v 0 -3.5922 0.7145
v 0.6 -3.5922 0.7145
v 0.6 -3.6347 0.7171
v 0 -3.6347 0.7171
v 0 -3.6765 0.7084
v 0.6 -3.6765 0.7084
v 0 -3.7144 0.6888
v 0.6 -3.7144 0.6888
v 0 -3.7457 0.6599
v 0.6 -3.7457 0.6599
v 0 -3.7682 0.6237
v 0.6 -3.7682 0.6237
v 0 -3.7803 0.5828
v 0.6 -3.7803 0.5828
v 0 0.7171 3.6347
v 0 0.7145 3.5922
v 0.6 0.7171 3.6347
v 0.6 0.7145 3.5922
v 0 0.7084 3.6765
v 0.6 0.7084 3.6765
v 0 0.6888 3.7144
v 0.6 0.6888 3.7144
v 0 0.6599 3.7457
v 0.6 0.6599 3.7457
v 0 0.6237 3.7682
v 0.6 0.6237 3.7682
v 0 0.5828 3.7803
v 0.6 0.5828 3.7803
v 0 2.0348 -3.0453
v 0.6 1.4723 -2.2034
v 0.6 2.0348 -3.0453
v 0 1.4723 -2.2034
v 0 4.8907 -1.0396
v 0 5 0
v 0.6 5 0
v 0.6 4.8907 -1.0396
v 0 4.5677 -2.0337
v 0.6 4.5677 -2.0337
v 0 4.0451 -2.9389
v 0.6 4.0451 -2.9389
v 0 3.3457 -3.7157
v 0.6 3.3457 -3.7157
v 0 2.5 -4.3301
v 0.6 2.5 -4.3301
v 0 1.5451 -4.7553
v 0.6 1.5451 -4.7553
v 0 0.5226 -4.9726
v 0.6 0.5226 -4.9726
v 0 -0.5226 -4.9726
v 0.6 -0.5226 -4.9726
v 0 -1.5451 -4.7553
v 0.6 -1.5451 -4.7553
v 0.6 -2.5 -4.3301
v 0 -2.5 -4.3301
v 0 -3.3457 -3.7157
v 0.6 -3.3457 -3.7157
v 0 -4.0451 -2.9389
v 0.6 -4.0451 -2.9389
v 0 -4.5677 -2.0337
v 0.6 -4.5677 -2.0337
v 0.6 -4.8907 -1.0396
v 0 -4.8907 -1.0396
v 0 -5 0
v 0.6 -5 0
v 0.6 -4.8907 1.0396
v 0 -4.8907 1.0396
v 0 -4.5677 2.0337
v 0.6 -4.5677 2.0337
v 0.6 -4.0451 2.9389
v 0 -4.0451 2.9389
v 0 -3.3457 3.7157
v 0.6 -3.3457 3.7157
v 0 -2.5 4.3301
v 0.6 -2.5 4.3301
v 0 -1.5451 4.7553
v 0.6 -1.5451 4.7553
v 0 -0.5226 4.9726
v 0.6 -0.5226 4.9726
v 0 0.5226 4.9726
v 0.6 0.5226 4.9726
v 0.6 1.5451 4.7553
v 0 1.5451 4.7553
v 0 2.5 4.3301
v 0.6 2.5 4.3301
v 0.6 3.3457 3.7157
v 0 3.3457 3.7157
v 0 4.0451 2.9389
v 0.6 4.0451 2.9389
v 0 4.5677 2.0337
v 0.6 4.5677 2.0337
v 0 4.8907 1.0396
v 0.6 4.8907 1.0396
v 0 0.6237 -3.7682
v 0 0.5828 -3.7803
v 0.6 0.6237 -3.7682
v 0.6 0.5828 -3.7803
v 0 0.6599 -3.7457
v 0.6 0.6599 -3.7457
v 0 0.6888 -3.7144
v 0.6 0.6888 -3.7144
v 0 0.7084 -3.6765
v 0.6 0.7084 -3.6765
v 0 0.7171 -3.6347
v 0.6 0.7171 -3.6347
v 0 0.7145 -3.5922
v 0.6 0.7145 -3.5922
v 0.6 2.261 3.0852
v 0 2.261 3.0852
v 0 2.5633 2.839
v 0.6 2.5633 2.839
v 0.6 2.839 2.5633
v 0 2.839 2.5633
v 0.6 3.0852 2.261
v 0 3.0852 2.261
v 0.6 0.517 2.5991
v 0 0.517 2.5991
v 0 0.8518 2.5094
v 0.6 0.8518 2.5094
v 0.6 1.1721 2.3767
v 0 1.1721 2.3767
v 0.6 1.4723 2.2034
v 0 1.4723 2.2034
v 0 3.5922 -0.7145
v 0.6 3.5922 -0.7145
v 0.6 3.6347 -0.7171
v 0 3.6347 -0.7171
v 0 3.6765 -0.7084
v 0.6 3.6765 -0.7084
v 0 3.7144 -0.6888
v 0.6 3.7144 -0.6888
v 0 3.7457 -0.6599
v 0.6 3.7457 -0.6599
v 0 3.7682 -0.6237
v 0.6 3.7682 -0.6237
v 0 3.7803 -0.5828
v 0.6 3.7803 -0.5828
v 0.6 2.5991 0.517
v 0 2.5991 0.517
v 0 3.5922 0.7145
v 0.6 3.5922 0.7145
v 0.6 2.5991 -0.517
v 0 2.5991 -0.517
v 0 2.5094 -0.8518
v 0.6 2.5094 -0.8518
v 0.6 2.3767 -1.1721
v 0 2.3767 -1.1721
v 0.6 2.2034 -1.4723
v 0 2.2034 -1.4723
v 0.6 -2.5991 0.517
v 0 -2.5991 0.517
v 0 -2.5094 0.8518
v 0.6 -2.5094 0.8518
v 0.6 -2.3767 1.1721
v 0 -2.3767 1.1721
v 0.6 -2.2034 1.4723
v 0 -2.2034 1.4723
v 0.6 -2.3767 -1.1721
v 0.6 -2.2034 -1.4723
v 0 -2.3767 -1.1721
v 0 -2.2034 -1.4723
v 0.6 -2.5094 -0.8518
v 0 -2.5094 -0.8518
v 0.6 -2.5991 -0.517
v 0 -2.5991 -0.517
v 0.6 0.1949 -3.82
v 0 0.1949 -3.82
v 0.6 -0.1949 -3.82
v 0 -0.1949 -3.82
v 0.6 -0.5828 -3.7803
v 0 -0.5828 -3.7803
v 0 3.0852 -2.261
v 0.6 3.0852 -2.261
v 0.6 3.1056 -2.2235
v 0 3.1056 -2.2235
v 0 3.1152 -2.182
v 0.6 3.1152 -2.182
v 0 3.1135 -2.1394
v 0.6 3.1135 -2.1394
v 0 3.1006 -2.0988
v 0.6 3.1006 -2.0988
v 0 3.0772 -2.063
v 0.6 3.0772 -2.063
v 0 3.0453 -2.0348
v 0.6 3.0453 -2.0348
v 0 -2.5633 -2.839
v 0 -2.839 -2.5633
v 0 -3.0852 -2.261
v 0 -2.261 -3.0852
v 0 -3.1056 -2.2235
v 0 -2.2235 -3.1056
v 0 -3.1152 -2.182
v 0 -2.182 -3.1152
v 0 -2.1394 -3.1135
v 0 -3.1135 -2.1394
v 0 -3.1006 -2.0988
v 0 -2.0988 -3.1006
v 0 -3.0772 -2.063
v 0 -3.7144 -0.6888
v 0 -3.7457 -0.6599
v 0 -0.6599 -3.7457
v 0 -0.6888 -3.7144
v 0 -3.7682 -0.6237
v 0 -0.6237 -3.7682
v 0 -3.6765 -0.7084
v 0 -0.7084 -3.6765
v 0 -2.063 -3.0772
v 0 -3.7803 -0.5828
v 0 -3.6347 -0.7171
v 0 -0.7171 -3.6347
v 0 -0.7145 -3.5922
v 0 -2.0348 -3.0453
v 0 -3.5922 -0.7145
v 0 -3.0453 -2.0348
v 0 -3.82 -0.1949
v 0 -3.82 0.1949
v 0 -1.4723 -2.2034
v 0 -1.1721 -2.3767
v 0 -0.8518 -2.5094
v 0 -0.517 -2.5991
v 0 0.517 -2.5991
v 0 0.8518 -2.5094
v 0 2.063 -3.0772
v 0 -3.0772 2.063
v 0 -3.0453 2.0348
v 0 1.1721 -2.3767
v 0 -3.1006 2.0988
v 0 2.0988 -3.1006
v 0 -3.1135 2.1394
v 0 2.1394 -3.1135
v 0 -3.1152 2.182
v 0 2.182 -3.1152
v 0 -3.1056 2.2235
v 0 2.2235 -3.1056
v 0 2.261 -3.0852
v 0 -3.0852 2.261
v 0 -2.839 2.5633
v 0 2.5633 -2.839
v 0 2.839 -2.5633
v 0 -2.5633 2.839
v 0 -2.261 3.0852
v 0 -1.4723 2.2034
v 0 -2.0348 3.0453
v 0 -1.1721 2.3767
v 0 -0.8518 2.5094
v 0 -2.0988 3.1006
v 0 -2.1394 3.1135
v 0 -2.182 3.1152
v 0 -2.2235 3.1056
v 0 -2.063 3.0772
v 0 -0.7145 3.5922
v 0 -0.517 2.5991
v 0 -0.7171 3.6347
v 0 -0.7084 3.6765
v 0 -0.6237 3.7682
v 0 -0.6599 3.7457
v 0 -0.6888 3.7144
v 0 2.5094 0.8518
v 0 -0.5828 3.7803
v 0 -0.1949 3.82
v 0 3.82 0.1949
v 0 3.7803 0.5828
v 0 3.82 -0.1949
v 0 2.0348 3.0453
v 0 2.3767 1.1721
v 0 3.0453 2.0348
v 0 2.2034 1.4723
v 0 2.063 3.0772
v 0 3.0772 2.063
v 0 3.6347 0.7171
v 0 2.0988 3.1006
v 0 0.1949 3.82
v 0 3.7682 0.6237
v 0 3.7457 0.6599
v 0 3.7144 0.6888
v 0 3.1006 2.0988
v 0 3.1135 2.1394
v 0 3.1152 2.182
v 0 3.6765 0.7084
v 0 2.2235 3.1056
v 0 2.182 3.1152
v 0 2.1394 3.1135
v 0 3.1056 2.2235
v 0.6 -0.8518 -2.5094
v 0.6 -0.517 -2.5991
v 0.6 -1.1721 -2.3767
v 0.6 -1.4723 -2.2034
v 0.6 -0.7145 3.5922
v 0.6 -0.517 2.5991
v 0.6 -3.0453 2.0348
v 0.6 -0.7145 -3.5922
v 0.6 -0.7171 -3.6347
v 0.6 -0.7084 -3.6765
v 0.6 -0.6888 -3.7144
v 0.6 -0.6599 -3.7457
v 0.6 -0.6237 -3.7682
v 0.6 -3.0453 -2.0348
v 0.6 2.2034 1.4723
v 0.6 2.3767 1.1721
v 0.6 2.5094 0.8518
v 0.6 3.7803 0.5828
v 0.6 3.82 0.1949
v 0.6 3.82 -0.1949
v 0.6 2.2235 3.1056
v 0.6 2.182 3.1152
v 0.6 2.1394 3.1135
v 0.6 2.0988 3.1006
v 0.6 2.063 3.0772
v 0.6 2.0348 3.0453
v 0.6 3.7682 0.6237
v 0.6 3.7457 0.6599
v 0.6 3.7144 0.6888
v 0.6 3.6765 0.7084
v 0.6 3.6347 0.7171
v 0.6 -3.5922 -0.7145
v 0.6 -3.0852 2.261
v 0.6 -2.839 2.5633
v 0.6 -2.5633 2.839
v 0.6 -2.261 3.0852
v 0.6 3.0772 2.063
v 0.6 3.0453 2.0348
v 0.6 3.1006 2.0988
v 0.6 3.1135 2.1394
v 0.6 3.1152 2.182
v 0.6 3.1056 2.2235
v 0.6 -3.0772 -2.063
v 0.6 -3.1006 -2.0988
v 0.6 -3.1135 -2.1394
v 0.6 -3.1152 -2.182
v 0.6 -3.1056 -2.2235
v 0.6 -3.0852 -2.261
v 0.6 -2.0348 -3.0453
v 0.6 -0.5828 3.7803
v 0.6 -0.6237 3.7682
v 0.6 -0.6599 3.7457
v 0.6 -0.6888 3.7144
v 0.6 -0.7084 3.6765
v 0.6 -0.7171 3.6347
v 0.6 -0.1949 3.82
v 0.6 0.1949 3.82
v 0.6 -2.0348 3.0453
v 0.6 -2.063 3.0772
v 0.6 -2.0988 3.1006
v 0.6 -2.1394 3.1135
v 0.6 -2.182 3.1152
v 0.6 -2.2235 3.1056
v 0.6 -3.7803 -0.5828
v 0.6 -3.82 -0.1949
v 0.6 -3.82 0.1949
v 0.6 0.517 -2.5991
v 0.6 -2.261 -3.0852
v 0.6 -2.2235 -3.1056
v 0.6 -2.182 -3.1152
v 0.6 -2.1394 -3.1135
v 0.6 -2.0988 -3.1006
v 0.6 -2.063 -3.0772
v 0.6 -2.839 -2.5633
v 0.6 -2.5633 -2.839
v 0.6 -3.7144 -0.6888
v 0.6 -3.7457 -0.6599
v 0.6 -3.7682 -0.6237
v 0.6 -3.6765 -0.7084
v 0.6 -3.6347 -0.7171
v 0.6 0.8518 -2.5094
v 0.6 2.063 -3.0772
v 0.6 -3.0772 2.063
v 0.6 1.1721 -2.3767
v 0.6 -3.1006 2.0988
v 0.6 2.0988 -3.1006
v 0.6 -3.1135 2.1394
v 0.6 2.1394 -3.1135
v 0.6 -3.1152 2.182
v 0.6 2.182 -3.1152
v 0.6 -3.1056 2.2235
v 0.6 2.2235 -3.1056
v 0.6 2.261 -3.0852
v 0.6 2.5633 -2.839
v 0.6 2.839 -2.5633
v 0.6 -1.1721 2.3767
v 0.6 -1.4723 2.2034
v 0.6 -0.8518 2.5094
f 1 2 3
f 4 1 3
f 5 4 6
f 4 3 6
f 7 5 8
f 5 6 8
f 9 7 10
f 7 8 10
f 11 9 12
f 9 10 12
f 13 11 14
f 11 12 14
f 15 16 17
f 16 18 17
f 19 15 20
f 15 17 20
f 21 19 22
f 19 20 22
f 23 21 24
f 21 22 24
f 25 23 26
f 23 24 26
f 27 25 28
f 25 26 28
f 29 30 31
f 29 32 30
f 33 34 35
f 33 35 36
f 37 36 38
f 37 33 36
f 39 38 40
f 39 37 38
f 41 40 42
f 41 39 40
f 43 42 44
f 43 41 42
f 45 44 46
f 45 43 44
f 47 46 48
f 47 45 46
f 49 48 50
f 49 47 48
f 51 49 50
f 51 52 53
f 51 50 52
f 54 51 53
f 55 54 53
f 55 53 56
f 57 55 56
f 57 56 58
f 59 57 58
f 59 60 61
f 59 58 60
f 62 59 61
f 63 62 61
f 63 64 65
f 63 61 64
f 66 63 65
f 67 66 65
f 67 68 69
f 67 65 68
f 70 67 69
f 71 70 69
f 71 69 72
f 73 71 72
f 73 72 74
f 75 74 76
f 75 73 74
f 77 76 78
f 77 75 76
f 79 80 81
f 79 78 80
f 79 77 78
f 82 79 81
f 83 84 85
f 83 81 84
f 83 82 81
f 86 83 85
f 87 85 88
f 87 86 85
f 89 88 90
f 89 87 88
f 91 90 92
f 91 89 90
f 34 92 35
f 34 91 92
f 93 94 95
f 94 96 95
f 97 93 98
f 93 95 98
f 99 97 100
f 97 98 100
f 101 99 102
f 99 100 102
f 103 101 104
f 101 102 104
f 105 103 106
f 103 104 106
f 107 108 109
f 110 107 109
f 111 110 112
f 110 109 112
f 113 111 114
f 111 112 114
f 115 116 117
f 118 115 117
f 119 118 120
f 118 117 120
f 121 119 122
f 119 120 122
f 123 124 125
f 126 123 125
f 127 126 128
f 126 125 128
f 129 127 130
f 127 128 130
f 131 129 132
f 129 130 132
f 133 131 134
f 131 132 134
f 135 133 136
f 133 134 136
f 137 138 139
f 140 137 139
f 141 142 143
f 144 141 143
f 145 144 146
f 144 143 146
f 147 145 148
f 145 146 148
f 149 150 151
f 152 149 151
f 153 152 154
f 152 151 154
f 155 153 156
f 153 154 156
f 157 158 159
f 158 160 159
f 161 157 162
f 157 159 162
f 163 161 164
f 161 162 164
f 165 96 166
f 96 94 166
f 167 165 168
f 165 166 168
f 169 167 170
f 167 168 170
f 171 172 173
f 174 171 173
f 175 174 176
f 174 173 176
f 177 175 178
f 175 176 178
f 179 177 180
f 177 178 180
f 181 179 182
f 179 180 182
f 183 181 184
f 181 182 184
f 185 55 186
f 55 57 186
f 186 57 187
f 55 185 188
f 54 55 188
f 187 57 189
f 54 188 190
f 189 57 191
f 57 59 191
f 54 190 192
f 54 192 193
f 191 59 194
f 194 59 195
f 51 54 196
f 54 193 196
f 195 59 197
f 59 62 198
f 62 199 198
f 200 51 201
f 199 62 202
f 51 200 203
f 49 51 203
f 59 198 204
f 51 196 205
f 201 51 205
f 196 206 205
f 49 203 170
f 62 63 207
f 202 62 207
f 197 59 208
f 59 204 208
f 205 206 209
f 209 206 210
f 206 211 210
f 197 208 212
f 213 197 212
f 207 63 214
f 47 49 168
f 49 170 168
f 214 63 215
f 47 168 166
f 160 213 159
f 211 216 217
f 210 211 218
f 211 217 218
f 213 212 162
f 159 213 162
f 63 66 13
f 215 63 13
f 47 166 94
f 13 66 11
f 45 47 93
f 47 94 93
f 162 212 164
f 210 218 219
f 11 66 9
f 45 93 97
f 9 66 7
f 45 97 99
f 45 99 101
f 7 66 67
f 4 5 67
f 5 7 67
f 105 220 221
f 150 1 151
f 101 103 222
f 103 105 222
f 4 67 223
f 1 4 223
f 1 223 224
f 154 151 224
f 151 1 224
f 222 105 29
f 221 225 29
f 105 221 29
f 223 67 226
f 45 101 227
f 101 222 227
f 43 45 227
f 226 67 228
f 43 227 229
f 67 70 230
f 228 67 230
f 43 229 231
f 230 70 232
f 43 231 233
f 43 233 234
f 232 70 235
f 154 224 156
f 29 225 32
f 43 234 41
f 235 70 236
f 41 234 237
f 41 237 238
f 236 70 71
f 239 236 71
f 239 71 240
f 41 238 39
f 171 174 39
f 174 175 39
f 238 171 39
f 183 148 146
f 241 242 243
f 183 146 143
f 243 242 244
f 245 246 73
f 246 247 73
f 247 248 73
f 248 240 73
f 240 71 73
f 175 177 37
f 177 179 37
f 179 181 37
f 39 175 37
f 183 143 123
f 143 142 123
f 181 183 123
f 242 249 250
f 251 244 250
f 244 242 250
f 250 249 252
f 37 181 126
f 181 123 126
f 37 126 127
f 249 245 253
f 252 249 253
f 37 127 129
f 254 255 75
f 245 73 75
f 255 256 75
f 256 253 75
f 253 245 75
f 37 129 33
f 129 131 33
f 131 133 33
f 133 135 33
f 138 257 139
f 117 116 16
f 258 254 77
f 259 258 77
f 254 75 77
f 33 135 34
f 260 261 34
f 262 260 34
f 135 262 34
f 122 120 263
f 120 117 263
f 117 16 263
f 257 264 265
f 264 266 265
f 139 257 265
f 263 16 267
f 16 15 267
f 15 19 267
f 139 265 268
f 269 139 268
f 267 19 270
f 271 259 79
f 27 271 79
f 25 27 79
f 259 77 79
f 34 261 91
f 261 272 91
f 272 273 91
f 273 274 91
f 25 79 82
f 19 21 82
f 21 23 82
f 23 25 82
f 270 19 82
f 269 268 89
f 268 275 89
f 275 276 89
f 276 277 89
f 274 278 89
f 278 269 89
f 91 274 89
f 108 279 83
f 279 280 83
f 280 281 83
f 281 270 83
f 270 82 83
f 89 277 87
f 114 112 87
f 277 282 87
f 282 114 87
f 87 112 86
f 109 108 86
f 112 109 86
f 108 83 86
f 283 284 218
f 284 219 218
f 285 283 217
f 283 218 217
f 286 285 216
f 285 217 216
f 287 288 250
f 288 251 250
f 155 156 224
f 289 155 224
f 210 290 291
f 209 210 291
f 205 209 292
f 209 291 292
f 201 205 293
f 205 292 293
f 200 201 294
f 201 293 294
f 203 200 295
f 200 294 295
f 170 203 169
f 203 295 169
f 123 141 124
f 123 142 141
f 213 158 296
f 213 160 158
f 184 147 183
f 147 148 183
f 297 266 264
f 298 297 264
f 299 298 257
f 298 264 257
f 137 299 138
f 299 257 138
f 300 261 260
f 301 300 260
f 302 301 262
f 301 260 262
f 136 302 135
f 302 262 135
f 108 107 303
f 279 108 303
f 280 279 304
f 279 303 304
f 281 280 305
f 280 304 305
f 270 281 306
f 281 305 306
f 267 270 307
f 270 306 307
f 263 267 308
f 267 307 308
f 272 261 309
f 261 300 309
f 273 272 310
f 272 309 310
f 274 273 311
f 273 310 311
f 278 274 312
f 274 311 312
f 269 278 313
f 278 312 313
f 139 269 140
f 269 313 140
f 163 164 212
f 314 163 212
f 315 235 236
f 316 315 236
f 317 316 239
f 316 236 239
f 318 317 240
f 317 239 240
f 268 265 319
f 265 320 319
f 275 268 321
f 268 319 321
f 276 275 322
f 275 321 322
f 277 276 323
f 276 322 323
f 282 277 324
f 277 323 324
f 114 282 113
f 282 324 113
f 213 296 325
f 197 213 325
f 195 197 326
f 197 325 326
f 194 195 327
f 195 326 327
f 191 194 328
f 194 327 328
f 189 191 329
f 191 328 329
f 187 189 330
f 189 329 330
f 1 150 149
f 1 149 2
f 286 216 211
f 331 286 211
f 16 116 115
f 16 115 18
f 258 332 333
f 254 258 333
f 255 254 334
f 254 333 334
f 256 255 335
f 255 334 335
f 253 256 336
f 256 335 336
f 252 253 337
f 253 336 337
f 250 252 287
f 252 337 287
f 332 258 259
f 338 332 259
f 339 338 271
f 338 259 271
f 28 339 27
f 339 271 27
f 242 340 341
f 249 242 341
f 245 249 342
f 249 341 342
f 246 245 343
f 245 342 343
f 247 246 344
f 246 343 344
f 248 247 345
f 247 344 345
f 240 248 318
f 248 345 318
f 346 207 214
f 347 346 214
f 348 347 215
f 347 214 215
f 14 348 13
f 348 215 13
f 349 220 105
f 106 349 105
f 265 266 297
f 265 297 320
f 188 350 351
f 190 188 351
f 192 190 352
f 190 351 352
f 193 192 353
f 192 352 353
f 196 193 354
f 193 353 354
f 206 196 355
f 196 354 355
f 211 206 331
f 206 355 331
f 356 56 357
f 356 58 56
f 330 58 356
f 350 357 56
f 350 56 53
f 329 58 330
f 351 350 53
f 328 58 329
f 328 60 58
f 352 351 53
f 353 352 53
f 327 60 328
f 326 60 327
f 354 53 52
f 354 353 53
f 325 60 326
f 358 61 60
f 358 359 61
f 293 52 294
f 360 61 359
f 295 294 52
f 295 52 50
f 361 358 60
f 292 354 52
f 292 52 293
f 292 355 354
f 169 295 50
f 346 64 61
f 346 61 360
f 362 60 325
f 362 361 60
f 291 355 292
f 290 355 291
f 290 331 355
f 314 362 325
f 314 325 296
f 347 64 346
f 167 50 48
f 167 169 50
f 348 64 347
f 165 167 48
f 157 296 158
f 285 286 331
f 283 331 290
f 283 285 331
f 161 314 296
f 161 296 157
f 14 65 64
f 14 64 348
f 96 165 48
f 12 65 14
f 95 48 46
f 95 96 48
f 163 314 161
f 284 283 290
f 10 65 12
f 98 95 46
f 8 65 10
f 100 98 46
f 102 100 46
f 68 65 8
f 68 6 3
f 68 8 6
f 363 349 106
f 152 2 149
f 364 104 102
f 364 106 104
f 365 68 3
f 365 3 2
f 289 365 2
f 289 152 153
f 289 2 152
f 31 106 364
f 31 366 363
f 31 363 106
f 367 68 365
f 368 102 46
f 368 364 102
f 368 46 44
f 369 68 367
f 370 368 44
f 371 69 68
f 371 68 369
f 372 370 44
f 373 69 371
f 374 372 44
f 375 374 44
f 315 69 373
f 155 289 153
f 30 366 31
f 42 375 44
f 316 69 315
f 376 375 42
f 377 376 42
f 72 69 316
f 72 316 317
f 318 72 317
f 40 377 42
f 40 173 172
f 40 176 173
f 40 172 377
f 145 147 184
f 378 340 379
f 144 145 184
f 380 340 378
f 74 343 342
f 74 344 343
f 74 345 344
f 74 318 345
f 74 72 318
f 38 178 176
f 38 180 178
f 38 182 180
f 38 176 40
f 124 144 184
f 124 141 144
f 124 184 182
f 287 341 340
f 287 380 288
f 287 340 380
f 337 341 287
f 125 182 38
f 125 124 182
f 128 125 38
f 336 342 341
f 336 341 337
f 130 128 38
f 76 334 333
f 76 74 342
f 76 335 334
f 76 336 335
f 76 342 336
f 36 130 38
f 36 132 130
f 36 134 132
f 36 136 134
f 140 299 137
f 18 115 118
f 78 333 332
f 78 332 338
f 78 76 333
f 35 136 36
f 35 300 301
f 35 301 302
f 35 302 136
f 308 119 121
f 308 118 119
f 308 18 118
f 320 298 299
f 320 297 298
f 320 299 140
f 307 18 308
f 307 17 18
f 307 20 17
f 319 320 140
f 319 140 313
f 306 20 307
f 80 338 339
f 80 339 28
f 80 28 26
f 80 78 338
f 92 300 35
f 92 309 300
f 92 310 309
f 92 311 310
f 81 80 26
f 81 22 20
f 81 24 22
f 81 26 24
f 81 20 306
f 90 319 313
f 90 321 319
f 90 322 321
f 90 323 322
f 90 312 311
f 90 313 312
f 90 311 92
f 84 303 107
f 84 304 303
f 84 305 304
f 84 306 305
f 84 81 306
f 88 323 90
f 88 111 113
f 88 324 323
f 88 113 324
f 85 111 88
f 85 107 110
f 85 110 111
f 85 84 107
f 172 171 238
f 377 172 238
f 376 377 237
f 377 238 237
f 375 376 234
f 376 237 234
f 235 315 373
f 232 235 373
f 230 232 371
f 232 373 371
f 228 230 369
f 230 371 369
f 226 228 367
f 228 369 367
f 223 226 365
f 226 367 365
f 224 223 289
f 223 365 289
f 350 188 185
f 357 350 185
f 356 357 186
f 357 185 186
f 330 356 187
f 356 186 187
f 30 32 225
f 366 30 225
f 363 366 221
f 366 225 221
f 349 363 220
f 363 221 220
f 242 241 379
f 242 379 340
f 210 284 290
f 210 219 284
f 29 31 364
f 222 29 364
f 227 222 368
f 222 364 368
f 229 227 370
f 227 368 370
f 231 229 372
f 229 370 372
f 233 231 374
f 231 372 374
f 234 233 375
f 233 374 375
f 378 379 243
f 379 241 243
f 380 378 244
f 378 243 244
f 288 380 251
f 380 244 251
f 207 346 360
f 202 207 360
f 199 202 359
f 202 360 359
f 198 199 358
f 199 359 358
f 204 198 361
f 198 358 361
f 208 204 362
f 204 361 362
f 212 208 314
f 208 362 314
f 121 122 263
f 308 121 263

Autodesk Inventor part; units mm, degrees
ref_plane "YZ Plane" through (0, 0, 0) normal (1, 0, 0) x (0, 1, 0)
ref_plane "XZ Plane" through (0, 0, 0) normal (0, 1, 0) x (-1, 0, 0)
sketch "Sketch1" plane through (0, 0, 0) normal (1, 0, 0) x (0, 1, 0)
  circle A0 centre (0, 0) radius 5
  circle A1 centre (0, 0) radius 2.65
  dimension "d0" = 10
  dimension "d1" = 5.3
extrude "Body" add sketch "Sketch1" along normal blind 0.6
sketch "Sketch2" plane through (0, 0, 0) normal (-1, 0, 0) x (0, 0, 1)
  circle A0 centre (0, 0) radius 2.65 projected
  circle A1 centre (0, 0) radius 5 projected
  arc A2 (0.7462, 3.7515) -> (-0.7462, 3.7515) centre (0, 0) ccw
  line L0 (-0.517, 2.5991) -> (-0.7462, 3.7515)
  line L1 (0, 0) -> (0, 3.825) construction
  line L2 (0.517, 2.5991) -> (0.7462, 3.7515)
  line L3 (-0.517, 2.5991) -> (0, 0) construction
  line L4 (0.517, 2.5991) -> (0, 0) construction
  dimension "d4" = 7.65
  dimension "d5" = 11.25
extrude "Cut" cut sketch "Sketch2" against normal blind 0.6 contours A0 L0 A2 L2
fillet "Fillet1" radius 0.159 2 edges at (0.3, 3.7515, 0.7462) (0.3, 3.7515, -0.7462)
pattern_circular "Cuts" count 8 over 360 about axis through (-10, 0, 0) along (1, 0, 0) of "Cut", "Fillet1"
ref_plane "Work Plane1" through (0, 0, 0) normal (0, 1, 0) x (1, 0, 0)
equation "\"d0\" = SD2"
equation "\"d1\" = SD1"
equation "\"d2\" = SD"
equation "\"d4\" = 0.5 * SD2 + 0.5 * SD1"
equation "\"d6\" = SD"
equation "\"d8\" = 0.03 * SD1"
equation "\"SD1\" = 5.3"
equation "\"SD2\" = 10"
equation "\"SD\" = 0.6"
equation "\"NND\" = 5"
properties part number "DIN 6797 - J 5.3" material "Steel, Mild"
